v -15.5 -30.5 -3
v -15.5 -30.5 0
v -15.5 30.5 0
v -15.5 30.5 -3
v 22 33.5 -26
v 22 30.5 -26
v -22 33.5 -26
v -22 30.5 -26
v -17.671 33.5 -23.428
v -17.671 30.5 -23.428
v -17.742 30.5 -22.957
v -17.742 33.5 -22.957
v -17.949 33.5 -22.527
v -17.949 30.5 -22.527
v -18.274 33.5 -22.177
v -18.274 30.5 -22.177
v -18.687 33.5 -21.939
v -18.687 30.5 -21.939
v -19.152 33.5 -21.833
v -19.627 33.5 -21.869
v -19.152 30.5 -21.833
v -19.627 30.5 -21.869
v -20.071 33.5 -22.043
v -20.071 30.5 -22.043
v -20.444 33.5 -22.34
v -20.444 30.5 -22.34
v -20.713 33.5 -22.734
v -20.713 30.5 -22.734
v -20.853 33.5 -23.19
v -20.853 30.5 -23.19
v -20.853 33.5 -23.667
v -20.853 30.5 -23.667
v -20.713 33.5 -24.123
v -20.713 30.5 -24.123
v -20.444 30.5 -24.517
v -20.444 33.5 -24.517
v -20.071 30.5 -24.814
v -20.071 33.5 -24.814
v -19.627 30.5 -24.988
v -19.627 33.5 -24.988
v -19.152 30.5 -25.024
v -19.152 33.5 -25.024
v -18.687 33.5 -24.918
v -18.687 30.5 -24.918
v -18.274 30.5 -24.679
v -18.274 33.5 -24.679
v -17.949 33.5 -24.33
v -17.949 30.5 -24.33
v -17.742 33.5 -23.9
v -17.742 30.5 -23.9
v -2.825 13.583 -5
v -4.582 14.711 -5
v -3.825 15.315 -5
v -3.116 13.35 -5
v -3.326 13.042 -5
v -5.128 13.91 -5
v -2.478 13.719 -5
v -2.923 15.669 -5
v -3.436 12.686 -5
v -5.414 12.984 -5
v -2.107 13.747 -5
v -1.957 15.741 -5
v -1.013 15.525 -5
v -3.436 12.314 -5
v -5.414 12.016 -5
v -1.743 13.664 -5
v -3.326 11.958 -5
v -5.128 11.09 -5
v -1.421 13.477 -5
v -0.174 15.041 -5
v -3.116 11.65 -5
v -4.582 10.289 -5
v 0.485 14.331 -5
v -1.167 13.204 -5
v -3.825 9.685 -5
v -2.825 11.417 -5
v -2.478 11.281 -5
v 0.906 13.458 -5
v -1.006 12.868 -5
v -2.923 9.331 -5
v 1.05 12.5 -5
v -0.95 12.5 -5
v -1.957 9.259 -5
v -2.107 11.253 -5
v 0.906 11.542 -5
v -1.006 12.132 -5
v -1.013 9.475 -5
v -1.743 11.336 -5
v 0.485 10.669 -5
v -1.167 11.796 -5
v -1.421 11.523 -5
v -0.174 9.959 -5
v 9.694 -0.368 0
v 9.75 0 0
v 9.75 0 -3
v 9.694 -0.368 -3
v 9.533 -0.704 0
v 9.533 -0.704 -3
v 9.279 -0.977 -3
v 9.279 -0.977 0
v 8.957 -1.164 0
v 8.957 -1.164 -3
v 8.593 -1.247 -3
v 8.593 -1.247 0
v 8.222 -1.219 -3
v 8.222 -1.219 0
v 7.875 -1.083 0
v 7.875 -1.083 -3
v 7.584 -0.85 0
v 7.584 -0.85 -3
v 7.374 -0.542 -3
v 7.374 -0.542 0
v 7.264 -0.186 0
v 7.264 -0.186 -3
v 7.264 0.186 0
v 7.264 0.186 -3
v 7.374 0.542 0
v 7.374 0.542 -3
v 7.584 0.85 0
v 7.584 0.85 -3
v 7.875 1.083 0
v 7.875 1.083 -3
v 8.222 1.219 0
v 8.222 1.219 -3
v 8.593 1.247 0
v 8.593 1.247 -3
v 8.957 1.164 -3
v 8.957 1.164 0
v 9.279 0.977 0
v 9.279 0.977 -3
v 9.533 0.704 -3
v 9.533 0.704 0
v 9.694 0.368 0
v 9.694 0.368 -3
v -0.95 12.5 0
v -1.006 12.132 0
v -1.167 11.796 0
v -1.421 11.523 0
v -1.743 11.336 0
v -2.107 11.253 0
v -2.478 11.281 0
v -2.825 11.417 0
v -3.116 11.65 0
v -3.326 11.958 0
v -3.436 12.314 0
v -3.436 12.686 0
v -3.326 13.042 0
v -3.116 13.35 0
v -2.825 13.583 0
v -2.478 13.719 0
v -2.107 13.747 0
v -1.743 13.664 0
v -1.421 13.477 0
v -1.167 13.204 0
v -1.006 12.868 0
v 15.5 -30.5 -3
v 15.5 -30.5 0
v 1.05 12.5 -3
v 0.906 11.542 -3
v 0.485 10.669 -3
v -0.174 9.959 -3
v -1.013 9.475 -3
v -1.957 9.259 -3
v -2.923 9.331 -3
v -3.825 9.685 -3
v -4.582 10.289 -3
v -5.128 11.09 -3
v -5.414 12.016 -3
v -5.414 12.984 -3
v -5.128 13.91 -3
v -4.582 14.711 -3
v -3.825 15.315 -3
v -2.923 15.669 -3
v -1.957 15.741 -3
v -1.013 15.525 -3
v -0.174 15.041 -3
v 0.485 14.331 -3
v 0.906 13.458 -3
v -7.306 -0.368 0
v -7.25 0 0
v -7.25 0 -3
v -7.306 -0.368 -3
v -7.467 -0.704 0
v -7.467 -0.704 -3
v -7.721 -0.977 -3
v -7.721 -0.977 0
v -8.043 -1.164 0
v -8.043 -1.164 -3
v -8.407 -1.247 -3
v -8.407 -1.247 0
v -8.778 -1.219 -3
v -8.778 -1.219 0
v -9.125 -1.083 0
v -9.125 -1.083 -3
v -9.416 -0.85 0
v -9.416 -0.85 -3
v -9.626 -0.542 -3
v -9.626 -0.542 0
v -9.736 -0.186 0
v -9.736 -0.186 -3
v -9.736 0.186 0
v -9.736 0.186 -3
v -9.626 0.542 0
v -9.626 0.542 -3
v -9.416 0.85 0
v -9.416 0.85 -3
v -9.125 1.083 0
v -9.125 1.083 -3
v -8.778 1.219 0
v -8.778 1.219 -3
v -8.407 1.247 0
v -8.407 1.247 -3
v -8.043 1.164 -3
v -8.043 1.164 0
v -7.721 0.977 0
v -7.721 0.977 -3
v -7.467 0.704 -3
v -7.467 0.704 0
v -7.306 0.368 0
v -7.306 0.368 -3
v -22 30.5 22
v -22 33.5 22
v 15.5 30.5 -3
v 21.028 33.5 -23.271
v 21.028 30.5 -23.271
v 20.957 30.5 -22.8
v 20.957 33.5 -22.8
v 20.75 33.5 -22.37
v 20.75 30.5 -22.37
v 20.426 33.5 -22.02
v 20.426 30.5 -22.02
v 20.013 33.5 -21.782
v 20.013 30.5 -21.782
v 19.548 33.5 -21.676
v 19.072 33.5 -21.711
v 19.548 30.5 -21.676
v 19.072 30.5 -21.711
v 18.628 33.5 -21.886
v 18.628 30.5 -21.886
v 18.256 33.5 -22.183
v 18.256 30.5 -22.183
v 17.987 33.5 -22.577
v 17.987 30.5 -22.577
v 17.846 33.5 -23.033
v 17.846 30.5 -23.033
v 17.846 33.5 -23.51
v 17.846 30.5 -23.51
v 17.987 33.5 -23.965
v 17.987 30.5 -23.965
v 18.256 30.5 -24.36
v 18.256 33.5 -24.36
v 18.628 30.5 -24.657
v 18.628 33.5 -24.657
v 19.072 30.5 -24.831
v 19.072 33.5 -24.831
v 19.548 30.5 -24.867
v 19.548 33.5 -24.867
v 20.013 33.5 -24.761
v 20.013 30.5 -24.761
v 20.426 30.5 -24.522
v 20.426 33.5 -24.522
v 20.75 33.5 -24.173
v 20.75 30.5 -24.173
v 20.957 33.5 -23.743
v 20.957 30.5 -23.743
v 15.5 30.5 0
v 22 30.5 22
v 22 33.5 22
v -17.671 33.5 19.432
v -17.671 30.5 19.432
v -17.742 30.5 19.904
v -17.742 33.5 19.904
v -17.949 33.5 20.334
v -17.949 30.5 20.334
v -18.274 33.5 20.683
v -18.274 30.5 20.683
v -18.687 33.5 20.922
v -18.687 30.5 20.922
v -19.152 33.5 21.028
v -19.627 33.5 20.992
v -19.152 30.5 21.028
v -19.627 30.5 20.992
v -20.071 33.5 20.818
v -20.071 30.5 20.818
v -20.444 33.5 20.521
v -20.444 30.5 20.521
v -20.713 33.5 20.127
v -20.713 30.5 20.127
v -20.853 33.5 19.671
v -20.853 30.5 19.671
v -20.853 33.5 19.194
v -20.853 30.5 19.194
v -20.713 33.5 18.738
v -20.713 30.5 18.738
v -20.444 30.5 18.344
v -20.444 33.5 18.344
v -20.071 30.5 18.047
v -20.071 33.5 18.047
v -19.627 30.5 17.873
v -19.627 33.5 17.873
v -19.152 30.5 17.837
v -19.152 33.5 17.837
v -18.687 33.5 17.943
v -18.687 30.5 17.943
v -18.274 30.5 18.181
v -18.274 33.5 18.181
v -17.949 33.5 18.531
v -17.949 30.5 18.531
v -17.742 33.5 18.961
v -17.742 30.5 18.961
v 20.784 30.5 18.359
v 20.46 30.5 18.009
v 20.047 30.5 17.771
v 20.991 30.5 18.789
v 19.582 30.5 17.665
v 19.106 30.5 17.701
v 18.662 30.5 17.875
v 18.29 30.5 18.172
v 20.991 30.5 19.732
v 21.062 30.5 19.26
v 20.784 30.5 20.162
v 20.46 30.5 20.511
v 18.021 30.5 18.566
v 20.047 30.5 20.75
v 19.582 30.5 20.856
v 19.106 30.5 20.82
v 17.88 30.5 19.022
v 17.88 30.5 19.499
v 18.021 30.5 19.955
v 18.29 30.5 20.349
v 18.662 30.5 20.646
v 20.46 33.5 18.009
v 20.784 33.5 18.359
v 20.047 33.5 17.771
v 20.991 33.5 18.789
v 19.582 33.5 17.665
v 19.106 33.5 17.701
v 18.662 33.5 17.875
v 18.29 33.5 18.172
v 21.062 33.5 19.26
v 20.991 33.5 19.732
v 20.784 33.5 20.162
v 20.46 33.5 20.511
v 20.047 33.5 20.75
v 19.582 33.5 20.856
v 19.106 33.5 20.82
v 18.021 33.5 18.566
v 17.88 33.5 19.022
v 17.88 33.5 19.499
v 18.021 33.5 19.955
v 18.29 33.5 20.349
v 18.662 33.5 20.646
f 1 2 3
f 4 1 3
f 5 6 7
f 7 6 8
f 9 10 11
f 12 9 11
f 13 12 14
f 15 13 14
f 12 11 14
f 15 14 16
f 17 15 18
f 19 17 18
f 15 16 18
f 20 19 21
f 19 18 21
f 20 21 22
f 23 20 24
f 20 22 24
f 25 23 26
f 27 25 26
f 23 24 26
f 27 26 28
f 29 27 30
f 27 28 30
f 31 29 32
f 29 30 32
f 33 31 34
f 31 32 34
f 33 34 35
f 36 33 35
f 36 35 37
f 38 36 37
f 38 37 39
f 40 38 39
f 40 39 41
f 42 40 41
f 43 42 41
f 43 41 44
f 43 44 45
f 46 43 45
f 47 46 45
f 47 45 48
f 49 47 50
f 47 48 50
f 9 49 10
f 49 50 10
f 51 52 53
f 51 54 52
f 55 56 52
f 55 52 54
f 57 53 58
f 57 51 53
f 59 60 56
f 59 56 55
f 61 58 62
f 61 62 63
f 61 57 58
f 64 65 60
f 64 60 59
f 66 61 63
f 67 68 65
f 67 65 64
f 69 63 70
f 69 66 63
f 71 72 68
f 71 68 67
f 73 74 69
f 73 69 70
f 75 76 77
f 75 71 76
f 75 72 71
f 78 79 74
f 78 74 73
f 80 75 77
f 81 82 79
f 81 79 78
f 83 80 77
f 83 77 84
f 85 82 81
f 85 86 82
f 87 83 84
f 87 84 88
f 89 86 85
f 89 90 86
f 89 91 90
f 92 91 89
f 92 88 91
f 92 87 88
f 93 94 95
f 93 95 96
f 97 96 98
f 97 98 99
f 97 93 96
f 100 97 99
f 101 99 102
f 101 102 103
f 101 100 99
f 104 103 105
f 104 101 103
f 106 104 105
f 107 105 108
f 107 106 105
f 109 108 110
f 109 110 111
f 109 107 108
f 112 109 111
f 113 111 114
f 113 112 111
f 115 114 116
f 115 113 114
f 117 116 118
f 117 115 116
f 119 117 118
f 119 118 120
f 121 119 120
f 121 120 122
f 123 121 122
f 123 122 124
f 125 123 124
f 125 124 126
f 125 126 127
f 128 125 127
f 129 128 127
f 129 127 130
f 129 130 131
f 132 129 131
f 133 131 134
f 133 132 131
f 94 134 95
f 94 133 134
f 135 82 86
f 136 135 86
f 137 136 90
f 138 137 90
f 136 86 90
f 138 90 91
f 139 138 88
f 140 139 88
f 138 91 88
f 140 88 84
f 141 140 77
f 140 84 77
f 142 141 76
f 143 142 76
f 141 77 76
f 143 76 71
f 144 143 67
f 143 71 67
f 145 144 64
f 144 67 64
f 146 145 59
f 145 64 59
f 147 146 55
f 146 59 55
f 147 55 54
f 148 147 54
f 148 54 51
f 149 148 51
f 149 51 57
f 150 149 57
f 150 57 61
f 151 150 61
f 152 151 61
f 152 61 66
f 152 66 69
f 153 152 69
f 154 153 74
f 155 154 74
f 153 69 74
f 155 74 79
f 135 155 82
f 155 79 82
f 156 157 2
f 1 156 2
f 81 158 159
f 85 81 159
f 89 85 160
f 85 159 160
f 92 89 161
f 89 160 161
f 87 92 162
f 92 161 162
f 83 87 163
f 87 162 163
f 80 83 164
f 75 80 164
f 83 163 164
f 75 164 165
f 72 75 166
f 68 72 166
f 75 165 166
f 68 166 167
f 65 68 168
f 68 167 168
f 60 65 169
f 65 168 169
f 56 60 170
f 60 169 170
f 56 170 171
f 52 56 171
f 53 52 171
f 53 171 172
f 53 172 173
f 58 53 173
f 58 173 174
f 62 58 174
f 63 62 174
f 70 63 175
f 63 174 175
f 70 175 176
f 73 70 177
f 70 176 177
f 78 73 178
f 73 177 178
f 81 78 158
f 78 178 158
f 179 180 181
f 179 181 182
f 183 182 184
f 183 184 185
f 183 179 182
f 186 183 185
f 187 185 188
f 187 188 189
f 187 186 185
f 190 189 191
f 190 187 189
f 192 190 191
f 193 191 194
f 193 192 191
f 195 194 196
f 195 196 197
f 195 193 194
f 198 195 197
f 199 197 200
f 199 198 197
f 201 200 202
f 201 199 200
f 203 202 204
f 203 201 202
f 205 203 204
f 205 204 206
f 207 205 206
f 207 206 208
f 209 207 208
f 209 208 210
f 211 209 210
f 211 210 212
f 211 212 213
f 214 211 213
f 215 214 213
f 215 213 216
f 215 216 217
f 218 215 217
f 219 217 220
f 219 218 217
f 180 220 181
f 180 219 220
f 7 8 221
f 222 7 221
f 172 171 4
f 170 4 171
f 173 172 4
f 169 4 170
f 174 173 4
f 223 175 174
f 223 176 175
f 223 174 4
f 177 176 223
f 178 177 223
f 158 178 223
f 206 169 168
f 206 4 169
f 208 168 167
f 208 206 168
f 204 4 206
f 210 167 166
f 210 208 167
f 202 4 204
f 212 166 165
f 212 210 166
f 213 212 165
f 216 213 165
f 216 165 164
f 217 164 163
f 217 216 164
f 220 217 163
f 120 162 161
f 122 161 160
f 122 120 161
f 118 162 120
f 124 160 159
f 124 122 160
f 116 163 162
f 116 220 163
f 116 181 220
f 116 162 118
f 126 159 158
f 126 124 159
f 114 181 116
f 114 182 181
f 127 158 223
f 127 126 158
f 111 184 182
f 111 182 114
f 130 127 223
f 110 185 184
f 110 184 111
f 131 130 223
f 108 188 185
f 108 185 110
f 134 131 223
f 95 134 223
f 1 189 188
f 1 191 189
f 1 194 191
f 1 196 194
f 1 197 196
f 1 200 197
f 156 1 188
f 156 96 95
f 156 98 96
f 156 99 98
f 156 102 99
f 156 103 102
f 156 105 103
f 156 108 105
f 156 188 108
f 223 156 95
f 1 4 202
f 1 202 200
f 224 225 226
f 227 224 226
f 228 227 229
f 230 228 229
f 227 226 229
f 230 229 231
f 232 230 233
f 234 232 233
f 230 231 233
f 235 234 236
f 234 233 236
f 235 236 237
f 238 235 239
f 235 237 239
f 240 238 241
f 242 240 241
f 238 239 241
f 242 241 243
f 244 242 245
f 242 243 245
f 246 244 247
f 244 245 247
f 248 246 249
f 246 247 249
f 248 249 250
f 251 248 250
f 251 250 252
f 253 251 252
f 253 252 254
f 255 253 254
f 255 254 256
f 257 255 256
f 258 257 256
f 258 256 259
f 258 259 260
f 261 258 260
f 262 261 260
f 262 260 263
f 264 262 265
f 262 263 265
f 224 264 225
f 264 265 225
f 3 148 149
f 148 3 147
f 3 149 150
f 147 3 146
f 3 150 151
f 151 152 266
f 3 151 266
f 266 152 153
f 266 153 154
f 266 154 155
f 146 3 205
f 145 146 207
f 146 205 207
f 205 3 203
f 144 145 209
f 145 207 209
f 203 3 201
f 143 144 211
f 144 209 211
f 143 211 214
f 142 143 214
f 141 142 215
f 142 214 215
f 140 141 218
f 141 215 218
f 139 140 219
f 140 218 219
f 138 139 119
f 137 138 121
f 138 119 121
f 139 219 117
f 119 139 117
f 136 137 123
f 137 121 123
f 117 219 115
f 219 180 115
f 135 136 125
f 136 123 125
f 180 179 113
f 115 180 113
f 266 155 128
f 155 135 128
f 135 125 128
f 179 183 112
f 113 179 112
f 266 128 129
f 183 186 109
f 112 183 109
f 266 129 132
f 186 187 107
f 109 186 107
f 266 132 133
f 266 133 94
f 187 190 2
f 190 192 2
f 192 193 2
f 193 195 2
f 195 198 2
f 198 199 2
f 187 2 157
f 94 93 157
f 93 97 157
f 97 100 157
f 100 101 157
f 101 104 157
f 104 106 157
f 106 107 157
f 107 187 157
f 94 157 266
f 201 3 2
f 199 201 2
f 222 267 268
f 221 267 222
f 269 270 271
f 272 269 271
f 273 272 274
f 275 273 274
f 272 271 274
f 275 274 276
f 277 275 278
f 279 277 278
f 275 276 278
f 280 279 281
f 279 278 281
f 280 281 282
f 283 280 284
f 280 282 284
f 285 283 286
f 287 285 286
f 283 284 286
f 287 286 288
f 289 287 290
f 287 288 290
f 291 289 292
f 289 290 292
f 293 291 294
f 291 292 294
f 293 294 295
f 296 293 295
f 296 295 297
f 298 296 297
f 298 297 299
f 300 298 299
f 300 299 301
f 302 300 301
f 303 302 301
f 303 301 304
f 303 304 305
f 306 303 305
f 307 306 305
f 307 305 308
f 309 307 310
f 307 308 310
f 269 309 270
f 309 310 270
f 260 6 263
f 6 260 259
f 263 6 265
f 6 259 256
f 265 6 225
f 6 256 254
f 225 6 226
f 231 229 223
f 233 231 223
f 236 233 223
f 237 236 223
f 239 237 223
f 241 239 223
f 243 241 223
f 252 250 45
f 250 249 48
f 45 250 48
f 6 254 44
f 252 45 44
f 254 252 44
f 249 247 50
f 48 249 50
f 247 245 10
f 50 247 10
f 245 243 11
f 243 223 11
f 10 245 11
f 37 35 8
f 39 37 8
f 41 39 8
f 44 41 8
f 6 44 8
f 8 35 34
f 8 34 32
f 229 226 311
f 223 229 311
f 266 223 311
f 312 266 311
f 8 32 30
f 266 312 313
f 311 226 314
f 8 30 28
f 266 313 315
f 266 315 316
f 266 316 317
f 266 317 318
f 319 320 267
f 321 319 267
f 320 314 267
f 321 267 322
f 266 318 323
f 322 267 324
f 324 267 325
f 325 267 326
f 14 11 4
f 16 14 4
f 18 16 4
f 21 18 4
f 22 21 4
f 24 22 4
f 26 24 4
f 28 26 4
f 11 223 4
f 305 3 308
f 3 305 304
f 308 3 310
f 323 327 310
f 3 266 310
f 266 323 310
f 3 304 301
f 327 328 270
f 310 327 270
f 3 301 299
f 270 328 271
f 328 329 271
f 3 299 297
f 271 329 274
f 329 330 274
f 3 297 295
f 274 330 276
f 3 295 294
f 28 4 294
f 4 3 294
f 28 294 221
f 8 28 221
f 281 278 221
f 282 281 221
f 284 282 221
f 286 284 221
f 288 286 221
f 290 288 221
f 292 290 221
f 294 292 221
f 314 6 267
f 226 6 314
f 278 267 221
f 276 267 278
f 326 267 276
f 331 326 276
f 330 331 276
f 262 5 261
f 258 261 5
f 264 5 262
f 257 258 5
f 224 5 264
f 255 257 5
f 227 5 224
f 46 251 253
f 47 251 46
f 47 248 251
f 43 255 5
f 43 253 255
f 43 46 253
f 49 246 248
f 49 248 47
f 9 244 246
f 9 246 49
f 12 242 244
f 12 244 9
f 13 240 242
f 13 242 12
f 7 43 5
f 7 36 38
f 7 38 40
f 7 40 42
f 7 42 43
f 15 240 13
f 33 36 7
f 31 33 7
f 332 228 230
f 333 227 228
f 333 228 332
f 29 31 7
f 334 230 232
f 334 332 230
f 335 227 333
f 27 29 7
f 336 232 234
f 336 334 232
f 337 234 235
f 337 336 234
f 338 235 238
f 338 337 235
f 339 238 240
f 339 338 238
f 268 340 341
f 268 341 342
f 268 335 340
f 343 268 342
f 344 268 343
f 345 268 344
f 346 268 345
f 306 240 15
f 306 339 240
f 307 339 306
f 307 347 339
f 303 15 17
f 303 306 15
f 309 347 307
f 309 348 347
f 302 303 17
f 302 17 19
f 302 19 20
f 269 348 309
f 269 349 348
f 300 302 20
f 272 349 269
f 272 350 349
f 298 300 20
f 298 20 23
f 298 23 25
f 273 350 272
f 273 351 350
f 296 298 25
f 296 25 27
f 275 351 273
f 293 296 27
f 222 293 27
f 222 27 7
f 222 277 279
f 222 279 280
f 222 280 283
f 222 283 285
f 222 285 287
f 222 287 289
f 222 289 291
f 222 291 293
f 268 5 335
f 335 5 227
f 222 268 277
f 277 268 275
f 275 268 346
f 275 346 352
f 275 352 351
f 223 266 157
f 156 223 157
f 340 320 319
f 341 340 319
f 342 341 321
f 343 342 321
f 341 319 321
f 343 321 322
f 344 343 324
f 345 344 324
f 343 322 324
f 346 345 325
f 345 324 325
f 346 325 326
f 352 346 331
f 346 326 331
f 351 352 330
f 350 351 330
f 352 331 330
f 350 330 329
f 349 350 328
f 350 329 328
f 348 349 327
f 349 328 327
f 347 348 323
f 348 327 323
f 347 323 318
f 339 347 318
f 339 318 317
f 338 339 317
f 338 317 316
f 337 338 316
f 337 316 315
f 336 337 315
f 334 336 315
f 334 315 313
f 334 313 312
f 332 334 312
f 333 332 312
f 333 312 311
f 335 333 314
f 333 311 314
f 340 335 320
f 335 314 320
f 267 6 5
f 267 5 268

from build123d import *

# Parameters (mm, degrees)
SKETCH_R        = 1.25
PAD_DEPTH       = 3
SKETCH002_W     = 44
SKETCH002_H     = 48
PAD001_DEPTH    = 3
SKETCH006_R     = 1.6
POCKET001_DEPTH = 3
SKETCH007_R     = 3.25
PAD004_DEPTH    = 2
SKETCH008_R     = 1.25
POCKET002_DEPTH = 5


with BuildPart() as part:
    # Sketch (on Face1 of Binder) → Pad (new body)
    with BuildSketch(Plane(origin=(0, 0, 0), x_dir=(1, 0, 0), z_dir=(0, 0, -1))):
        Polygon((-15.5, 28.5), (-15.5, -28.5), (-15.5, -30.5), (15.5, -30.5), (15.5, -28.5), (15.5, 28.5), (15.5, 30.5), (-15.5, 30.5), align=None)
        with Locations((-8.5, 0)):
            Circle(SKETCH_R, mode=Mode.SUBTRACT)
        with Locations((8.5, 0)):
            Circle(SKETCH_R, mode=Mode.SUBTRACT)
    extrude(amount=PAD_DEPTH)

    # Sketch002 (on Face1 of Pad) → Pad001 (join)
    with BuildSketch(Plane(origin=(0, 30.5, 0), x_dir=(-1, 0, 0), z_dir=(0, 1, 0))):
        with Locations((0, -2)):
            Rectangle(SKETCH002_W, SKETCH002_H)
    extrude(amount=PAD001_DEPTH)

    # Sketch006 (on Face3 of Pad001) → Pocket001 (cut)
    with BuildSketch(Plane.XZ.offset(-30.5)):
        with Locations((-19.271234, 19.432414)):
            Circle(SKETCH006_R)
        with Locations((19.462404, 19.260412)):
            Circle(SKETCH006_R)
        with Locations((19.428404, -23.271234)):
            Circle(SKETCH006_R)
        with Locations((-19.271234, -23.428404)):
            Circle(SKETCH006_R)
    extrude(amount=-POCKET001_DEPTH, mode=Mode.SUBTRACT)

    # Sketch007 (on Face8 of Pocket001) → Pad004 (join)
    with BuildSketch(Plane(origin=(0, 0, -3), x_dir=(1, 0, 0), z_dir=(0, 0, -1))):
        with Locations((-2.2, -12.5)):
            Circle(SKETCH007_R)
    extrude(amount=PAD004_DEPTH)

    # Sketch008 (on Face19 of Pad004) → Pocket002 (cut)
    with BuildSketch(Plane(origin=(0, 0, -5), x_dir=(1, 0, 0), z_dir=(0, 0, -1))):
        with Locations((-2.2, -12.5)):
            Circle(SKETCH008_R)
    extrude(amount=-POCKET002_DEPTH, mode=Mode.SUBTRACT)


solid = part.part
